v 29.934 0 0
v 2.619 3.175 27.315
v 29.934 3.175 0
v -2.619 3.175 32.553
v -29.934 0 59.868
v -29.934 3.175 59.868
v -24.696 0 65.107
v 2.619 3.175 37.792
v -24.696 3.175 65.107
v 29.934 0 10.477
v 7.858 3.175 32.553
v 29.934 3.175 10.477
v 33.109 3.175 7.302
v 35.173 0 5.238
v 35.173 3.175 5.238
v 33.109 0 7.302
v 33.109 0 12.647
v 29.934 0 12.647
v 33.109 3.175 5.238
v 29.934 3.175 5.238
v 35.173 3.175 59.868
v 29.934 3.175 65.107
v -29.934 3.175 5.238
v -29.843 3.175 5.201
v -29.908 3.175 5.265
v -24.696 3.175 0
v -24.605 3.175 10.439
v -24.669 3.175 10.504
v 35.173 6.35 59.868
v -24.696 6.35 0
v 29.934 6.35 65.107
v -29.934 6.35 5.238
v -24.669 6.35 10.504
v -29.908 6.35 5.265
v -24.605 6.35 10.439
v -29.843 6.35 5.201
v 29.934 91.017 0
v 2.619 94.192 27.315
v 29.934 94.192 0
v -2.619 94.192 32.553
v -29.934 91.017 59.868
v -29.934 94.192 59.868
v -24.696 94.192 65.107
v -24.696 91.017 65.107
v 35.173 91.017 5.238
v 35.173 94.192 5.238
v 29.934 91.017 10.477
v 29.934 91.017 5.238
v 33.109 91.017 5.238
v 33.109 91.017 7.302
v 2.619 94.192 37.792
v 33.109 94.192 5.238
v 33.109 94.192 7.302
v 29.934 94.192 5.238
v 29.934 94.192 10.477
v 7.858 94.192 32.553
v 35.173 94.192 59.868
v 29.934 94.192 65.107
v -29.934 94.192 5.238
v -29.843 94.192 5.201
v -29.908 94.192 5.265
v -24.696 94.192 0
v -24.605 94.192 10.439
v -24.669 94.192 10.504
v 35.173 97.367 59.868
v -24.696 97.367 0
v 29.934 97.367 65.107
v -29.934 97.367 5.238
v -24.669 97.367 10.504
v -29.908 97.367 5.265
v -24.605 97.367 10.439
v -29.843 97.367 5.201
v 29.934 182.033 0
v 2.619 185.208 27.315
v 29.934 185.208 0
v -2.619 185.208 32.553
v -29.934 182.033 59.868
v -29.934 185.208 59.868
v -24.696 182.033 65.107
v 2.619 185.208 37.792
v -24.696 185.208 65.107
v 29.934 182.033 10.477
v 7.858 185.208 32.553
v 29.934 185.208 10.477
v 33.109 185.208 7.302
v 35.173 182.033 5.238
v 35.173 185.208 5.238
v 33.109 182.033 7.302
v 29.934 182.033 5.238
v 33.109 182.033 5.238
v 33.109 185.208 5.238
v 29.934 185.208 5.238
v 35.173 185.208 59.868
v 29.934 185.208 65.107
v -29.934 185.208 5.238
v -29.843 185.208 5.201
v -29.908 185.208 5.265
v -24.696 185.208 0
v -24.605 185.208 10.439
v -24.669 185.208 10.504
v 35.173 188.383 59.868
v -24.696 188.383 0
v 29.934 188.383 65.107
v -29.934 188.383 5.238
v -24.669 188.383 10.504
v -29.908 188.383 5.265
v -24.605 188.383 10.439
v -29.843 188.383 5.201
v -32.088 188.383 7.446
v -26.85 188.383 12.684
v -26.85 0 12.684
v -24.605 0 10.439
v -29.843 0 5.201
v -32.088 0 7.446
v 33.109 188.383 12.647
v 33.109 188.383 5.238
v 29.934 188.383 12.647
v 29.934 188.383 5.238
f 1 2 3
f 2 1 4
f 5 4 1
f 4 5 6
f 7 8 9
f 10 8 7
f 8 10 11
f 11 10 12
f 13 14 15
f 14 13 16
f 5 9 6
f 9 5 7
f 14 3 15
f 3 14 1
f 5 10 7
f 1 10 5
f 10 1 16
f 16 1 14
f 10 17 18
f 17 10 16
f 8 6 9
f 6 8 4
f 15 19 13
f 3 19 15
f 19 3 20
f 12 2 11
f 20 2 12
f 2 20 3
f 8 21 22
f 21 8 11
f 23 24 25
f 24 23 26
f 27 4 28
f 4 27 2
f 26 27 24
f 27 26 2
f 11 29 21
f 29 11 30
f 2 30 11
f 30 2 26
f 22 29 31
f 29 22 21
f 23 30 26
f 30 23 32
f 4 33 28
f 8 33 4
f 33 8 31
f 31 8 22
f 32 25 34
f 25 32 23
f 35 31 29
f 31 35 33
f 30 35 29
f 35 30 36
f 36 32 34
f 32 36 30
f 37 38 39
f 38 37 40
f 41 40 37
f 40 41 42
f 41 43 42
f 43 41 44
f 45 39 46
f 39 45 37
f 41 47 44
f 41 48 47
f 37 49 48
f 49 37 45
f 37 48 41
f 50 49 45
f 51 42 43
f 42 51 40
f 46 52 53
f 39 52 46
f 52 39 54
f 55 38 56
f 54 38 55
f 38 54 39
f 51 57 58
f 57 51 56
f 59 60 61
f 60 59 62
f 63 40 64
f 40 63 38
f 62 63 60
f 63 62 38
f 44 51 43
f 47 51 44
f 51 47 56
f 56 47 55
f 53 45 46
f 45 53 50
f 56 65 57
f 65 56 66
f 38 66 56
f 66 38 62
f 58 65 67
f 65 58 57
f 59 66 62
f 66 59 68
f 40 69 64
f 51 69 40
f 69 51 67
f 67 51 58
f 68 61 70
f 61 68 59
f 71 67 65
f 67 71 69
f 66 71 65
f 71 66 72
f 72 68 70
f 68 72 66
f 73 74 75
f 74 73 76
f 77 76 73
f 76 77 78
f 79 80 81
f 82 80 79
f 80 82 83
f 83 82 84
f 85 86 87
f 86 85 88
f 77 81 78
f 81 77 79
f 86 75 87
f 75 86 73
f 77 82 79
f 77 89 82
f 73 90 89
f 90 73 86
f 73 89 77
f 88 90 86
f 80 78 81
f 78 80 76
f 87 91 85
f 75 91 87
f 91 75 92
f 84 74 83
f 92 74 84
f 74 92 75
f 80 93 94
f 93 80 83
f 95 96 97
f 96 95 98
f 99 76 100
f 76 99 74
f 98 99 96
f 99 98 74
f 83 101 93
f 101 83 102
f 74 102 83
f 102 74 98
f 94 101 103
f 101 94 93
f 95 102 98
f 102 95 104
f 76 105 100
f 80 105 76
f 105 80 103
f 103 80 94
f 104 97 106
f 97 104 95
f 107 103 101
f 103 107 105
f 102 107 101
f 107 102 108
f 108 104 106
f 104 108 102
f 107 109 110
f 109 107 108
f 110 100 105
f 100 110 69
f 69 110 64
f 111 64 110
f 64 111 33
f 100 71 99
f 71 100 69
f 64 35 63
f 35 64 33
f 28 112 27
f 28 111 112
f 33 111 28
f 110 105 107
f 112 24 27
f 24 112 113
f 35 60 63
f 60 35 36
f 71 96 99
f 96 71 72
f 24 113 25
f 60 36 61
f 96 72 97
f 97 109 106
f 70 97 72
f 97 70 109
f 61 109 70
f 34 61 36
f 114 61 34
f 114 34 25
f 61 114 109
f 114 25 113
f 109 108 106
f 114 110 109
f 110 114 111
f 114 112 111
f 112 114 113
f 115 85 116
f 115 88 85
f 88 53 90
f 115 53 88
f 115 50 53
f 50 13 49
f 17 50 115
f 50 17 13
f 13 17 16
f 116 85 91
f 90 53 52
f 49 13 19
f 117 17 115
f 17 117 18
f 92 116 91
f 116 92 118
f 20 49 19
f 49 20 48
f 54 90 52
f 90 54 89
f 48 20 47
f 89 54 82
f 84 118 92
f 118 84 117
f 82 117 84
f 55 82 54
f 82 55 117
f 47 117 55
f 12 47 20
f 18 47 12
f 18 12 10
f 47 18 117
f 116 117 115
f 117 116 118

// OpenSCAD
// 1:12 scale
sf = 12.0 ; // scale factor 1:12
// nominal 2x4 : 1.5 x 3.5
w2x4 = 88.9/ sf; // 3.5" in mm
h2x4 = 38.1 / sf; // 1.5" in mm
span = 1016.0 / sf; // 40" 
log_len = 406.4 / sf; //16"

module rotate_about_pt(rot, pt) {
    translate(pt)
        rotate(rot)
            translate(-pt)
                children();   
}

// cross bars
// position (Y axis)
// board width, height, length
module x_frame(pos, bw, bh, bl, x_off, z_off) {
    
    translate([x_off,pos,0]) {
        rotate([0, -45, 0])
            cube([bw, bh, bl]);
        
        translate([-(2*x_off), bh, z_off])
            rotate([0,45,0])
                cube([bw, bh, bl]);
    };
}

// location of 1/2 hypotenuse on base
x_off = (cos(45) * (0.5 * span));


w_45_hyp = w2x4;
w_45_side = (cos(45) * w2x4);
w_45_height = (cos(45) *w_45_side);

// compensate for openscad's choice of rotation point
z_off =w_45_side;

union() {
    x_frame(0, w2x4, h2x4, span, x_off, z_off);
    x_frame((2*h2x4) + span, w2x4, h2x4, span, x_off, z_off);
    x_frame((4*h2x4) + (2*span), w2x4, h2x4, span, x_off, z_off);
    full_len = (6*h2x4) + (2*span);
    
    translate([-x_off, 0, z_off]) {
        translate([0.5*h2x4, 0, 0.5*w2x4])
        rotate([0, 45, 0])
        translate([-0.5*h2x4, 0, -0.5*w2x4])
        cube([h2x4, full_len, w2x4]); 
    };

    translate([x_off, 0, z_off]) {
        //translate([0.5*h2x4, 0, 0.5*w2x4])
        //rotate([0, -45, 0])
        //translate([-0.5*h2x4, 0, -0.5*w2x4])
        cube([h2x4, full_len, w2x4]); 
    };
};
